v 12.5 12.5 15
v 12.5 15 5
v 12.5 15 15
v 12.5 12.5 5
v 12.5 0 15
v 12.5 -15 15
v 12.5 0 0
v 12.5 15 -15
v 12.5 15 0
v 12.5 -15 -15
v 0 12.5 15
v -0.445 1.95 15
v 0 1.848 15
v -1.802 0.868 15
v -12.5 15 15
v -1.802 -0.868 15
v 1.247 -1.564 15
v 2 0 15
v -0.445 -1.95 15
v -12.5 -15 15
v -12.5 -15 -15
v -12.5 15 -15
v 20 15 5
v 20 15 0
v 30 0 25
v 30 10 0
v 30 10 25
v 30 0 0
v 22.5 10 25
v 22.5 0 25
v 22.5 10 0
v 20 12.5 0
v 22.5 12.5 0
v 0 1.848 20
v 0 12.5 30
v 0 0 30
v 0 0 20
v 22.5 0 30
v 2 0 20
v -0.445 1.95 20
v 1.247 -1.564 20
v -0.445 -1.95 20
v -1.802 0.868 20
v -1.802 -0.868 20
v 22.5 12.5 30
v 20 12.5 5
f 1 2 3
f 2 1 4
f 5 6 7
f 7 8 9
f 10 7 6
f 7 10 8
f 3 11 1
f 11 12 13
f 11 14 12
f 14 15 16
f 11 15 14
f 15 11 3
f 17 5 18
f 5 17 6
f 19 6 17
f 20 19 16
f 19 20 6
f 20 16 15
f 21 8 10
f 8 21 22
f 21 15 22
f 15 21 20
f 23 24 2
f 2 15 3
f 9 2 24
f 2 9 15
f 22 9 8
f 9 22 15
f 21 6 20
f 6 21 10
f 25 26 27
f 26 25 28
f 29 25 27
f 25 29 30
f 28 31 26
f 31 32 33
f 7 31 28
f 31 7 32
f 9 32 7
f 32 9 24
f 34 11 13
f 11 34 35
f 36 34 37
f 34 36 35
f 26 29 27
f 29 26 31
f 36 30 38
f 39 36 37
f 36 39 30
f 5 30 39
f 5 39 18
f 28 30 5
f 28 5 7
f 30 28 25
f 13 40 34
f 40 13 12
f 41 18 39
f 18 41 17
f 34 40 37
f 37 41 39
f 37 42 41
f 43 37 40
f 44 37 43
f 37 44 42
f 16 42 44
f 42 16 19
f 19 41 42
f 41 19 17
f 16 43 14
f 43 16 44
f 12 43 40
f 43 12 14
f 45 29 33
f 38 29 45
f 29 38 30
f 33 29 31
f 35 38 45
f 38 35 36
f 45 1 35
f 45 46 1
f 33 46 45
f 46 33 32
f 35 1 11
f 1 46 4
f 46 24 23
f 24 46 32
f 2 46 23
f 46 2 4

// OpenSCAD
// Generated by generate_scads.py
union() {
  scale([1.5,0.5,2.0]) {
    cube(size=[15,25,15], center=false);
  }
  union() {
    sphere(r=12);
    cube(size=[25,30,30], center=true);
    cube(size=[30,10,25], center=false);
    cylinder(h=20, r=2, center=false);
  }
  difference() {
    cube(size=[5,5,5], center=true);
    cube(size=[10,5,30], center=true);
    cube(size=[30,10,15], center=false);
  }
  cube(size=[20,15,5], center=false);
}
